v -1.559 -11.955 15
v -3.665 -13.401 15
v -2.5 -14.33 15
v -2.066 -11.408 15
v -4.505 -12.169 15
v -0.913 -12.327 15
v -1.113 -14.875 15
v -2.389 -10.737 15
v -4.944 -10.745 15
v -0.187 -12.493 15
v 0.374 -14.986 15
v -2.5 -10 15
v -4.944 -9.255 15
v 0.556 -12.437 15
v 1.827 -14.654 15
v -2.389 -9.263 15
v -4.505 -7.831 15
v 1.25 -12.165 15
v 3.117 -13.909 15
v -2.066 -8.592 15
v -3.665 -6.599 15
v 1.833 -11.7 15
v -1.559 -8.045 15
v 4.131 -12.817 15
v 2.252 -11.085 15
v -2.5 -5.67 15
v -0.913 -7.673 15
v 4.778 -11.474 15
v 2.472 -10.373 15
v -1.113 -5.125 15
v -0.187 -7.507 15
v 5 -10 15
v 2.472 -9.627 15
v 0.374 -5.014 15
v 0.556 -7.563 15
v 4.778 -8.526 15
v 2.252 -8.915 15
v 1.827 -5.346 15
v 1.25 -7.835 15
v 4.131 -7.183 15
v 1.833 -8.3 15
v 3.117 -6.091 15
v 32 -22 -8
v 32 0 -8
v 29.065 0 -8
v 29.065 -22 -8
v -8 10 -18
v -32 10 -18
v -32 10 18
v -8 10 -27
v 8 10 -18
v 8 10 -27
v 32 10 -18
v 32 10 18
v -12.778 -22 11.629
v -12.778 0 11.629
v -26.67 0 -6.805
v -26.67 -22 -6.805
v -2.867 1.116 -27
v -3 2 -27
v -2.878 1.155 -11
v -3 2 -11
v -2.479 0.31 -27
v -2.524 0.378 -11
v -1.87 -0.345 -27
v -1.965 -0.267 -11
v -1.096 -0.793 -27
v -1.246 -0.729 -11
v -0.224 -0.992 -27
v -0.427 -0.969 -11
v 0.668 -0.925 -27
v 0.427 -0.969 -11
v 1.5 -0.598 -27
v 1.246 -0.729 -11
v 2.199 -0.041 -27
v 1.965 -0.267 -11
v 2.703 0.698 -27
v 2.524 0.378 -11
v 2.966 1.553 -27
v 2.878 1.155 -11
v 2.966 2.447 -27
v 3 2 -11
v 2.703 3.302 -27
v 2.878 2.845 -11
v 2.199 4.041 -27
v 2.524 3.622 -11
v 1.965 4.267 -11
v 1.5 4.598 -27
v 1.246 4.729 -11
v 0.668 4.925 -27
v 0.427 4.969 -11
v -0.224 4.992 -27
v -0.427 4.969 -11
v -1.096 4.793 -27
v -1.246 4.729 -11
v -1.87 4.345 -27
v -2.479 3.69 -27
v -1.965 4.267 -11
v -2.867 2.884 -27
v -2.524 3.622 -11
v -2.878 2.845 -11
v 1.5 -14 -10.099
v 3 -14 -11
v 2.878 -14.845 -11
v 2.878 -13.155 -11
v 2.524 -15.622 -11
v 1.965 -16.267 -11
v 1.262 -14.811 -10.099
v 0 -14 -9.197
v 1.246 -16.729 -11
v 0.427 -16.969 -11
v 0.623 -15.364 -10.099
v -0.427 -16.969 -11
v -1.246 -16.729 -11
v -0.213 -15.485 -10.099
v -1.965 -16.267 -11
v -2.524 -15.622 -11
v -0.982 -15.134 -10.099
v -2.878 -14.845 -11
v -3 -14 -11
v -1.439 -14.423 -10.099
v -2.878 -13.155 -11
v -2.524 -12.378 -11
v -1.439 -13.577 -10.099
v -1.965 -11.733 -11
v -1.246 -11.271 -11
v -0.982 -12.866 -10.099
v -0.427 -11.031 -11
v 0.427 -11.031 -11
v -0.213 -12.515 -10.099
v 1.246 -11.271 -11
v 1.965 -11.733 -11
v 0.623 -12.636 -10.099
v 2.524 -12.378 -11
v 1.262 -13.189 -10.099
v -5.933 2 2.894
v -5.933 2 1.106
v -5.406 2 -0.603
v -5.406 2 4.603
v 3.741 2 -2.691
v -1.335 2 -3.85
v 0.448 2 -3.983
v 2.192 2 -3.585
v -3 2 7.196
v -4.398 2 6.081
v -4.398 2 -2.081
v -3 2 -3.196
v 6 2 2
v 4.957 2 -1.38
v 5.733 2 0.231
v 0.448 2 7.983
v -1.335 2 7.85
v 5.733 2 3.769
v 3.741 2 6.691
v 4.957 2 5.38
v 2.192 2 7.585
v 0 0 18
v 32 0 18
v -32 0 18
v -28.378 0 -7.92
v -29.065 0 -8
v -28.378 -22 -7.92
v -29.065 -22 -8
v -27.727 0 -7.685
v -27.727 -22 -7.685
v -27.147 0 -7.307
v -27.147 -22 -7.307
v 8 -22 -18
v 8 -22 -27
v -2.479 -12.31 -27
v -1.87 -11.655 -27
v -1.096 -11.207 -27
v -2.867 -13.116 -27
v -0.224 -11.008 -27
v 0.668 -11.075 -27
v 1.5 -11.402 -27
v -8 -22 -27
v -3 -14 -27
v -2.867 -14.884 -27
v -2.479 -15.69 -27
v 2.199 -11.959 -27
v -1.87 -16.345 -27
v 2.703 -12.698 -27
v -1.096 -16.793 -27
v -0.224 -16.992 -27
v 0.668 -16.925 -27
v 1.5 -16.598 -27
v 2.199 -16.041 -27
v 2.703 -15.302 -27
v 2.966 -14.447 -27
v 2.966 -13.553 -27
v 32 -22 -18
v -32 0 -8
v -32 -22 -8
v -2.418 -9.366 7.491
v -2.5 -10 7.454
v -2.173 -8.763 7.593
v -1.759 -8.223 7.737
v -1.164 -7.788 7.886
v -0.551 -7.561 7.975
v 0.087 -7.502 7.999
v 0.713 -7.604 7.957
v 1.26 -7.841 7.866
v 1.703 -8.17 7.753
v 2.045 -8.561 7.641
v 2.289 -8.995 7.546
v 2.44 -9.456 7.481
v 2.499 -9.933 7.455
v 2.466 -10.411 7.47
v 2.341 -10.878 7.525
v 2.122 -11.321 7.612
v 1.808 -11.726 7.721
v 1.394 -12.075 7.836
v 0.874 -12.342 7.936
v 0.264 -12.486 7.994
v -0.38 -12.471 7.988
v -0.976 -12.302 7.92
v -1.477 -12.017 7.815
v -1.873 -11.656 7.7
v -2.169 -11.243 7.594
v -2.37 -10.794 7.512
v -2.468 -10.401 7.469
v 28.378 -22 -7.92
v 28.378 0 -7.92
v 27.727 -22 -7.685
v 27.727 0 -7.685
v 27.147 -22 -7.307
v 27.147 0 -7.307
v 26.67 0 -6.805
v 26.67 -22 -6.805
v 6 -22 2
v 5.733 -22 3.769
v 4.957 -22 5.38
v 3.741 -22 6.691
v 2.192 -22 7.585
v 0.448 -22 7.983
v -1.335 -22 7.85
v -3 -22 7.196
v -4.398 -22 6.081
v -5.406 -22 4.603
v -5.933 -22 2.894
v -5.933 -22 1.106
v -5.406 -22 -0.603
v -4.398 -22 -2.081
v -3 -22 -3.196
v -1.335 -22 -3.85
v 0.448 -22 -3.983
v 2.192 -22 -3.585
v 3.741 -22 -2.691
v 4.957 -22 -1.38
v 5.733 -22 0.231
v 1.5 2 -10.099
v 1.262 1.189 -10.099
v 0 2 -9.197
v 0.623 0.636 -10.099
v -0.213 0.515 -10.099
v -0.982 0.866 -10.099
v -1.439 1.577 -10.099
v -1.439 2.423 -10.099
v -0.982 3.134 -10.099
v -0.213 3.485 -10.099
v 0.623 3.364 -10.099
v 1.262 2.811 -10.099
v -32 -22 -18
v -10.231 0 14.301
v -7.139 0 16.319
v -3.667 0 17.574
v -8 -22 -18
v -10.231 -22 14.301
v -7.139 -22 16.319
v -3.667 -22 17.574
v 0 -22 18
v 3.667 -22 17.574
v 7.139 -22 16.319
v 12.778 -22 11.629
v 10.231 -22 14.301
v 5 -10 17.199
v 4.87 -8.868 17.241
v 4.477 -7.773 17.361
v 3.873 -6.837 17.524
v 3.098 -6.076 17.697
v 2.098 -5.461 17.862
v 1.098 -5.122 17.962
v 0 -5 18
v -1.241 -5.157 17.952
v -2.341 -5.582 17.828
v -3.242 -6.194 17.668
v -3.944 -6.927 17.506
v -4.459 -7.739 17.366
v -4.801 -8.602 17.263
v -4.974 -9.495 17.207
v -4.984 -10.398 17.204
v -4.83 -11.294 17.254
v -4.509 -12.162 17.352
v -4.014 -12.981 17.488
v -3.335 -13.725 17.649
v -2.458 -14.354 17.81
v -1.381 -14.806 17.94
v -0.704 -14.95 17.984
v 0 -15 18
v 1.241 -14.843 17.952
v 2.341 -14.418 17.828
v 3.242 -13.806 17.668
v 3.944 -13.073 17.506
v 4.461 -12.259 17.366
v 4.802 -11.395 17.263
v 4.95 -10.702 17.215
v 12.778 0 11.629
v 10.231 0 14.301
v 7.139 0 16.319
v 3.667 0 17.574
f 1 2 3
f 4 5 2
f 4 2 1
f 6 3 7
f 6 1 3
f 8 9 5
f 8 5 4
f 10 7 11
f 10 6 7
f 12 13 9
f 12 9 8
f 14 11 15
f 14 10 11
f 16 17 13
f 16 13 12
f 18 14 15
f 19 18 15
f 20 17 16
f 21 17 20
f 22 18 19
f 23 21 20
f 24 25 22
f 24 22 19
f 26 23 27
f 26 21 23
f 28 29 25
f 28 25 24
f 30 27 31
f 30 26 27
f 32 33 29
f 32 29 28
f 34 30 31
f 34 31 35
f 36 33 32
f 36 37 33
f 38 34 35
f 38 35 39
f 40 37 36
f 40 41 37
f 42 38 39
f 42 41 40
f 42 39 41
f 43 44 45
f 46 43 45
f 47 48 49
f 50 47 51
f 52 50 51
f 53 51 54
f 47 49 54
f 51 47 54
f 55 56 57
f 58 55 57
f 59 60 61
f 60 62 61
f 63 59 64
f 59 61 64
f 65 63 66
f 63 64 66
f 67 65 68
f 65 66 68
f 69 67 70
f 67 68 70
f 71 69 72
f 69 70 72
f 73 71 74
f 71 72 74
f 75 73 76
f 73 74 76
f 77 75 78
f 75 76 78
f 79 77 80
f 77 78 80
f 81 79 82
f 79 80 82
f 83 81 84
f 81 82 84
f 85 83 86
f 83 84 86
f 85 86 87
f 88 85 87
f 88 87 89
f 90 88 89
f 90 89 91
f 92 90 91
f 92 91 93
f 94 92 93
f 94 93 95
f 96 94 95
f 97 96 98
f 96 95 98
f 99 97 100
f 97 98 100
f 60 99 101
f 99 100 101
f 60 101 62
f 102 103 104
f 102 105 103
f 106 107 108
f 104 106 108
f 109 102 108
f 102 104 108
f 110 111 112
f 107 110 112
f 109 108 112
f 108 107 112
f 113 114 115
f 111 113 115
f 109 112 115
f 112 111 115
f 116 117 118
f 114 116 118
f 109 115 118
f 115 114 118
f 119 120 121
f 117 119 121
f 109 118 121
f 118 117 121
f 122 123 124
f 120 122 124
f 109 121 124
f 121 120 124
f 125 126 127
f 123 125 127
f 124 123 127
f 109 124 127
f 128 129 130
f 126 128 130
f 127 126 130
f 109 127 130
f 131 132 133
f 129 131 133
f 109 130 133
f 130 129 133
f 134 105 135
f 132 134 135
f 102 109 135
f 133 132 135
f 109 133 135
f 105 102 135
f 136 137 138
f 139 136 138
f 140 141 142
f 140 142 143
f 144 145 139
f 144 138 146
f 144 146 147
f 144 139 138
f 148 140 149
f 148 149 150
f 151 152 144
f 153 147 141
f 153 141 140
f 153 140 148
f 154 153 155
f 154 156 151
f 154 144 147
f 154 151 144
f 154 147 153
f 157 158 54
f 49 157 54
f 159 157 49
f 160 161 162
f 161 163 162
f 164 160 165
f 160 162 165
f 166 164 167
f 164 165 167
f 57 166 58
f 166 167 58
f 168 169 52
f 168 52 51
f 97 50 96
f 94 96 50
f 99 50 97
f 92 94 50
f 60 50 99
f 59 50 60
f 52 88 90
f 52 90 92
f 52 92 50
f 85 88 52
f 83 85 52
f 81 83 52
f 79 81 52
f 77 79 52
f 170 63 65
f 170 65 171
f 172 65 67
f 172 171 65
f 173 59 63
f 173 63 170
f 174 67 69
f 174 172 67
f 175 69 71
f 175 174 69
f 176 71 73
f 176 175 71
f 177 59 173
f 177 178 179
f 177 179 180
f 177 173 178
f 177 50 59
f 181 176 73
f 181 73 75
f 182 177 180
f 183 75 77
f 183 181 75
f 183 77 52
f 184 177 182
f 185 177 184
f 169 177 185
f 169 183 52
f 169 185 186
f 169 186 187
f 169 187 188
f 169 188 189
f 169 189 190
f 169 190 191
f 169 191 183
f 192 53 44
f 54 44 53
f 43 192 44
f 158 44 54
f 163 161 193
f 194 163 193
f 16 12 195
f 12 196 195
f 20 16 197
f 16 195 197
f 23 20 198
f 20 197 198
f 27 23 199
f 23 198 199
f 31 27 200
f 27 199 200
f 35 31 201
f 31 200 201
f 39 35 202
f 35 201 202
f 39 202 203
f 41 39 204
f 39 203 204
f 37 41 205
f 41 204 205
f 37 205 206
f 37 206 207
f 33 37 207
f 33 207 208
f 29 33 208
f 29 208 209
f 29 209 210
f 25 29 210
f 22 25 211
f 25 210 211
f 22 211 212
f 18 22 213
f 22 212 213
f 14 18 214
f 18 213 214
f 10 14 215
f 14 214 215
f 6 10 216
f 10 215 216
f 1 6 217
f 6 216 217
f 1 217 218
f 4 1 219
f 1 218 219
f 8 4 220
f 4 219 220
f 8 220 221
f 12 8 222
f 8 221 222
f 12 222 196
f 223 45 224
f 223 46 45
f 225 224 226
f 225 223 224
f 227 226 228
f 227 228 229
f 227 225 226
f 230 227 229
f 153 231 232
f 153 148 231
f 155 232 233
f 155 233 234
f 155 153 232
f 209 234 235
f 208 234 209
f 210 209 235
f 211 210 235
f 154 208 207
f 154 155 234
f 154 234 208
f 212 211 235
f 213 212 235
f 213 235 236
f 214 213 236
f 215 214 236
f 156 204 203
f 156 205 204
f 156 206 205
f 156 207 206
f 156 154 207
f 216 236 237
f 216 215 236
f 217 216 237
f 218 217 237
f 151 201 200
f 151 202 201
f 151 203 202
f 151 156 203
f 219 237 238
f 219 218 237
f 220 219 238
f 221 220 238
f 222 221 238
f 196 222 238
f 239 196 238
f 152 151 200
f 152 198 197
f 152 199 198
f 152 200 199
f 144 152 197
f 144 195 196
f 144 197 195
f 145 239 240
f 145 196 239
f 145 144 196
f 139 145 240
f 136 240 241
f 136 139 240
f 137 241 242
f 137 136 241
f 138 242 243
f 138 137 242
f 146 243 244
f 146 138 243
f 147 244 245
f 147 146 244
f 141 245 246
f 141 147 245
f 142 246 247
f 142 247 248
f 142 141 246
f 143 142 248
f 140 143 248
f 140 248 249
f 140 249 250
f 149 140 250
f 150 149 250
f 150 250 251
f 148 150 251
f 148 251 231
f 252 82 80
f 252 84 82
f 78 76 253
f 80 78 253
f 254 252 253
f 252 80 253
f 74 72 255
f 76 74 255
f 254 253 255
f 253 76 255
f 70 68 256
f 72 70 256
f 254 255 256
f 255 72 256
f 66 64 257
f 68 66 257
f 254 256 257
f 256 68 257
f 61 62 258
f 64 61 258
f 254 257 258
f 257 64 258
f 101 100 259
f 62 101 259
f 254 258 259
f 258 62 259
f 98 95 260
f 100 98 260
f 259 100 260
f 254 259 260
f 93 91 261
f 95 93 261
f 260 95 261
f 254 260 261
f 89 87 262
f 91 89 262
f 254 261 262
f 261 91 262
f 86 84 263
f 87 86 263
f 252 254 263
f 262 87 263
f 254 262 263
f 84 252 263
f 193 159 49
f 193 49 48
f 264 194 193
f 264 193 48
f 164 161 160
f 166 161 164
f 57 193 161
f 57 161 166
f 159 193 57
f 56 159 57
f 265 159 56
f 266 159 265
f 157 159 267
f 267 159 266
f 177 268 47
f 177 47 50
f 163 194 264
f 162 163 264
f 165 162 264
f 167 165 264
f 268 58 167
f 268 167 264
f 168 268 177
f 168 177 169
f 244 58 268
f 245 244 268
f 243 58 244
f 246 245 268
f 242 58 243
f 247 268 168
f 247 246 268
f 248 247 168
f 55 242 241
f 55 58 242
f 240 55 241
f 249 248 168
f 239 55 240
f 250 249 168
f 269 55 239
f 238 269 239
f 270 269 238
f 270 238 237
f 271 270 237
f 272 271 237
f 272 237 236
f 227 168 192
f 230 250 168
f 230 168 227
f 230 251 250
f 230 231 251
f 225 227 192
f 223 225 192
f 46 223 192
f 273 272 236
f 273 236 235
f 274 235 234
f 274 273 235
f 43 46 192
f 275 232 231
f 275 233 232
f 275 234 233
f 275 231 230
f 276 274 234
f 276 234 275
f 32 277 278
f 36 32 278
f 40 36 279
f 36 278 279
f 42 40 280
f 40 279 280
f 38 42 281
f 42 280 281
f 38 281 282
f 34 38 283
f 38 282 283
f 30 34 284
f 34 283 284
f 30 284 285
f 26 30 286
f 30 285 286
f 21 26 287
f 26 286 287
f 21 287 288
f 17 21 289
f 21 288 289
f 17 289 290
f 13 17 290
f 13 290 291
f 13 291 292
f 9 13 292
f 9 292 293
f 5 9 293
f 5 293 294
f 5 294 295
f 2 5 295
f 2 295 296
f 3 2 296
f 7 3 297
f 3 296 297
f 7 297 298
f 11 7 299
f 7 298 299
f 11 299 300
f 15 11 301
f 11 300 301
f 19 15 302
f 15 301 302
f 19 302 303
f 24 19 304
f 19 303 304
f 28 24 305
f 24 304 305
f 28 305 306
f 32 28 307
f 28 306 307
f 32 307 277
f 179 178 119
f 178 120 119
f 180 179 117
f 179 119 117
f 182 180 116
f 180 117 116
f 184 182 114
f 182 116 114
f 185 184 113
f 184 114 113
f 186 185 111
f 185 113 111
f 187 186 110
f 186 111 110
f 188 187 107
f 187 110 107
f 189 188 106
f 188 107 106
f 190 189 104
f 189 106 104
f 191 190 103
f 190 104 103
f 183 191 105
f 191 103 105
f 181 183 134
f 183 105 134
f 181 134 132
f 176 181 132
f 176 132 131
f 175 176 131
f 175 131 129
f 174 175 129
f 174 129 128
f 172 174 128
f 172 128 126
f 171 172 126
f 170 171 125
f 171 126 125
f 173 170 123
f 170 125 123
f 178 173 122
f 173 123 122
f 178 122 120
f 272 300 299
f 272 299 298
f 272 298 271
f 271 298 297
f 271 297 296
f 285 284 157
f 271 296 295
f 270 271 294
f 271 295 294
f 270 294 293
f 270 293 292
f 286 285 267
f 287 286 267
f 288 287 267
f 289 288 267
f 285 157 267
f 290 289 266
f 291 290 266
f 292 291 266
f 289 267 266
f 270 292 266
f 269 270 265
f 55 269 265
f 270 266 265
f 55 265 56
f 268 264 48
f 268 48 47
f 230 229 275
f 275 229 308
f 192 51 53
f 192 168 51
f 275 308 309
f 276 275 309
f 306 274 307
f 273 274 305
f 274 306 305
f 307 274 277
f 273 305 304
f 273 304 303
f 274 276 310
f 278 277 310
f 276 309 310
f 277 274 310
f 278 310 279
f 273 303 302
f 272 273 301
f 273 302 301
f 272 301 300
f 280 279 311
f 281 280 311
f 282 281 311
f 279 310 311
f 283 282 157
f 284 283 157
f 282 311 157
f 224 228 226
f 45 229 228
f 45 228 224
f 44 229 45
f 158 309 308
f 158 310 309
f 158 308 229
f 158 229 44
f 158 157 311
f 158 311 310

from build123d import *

# Parameters (mm, degrees)
F0_R           = 6
F1_DEPTH       = 22
F2_DEPTH       = 10
F3_R           = 3
F5_D           = 5
F5_DEPTH       = 16
F5_CBORE_D     = 10
F5_CBORE_DEPTH = 3
F5_TIP         = 1.5021515476
F7_DEPTH       = 2
F8_D           = 6
F8_DEPTH       = 16
F8_TIP         = 1.8025818571


with BuildPart() as f1:
    # F0 (on Front) → F1 (new body)
    with BuildSketch(Plane.XZ):
        with BuildLine():
            ThreePointArc((12.7781681608, 11.6290403704), (7.1391649946, 16.3189497932), (-3.39e-08, 18))
            ThreePointArc((-3.39e-08, 18), (-7.1391650249, 16.3189497781), (-12.7781681608, 11.6290403704))
            Line((-12.7781681608, 11.6290403704), (-27.5697110315, -8))
            Line((-27.5697110315, -8), (-32, -8))
            Line((-32, -8), (-32, -18))
            Line((-32, -18), (-8, -18))
            Line((-8, -18), (-8, -27))
            Line((-8, -27), (8, -27))
            Line((8, -27), (8, -18))
            Line((8, -18), (32, -18))
            Line((32, -18), (32, -8))
            Line((32, -8), (27.5697110315, -8))
            Line((27.5697110315, -8), (12.7781681608, 11.6290403704))
        make_face()
        with Locations((0, 2)):
            Circle(F0_R, mode=Mode.SUBTRACT)
    extrude(amount=F1_DEPTH)

    # F0 (on Front) → F2 (join)
    with BuildSketch(Plane.XZ):
        with BuildLine():
            Line((32, -8), (32, 18))
            Line((32, 18), (-3.39e-08, 18))
            ThreePointArc((-3.39e-08, 18), (7.1391649946, 16.3189497932), (12.7781681608, 11.6290403704))
            Line((12.7781681608, 11.6290403704), (27.5697110315, -8))
            Line((27.5697110315, -8), (32, -8))
        make_face()
        with BuildLine():
            ThreePointArc((-12.7781681608, 11.6290403704), (-7.1391650249, 16.3189497781), (-3.39e-08, 18))
            Line((-3.39e-08, 18), (-32, 18))
            Line((-32, 18), (-32, -8))
            Line((-32, -8), (-27.5697110315, -8))
            Line((-27.5697110315, -8), (-12.7781681608, 11.6290403704))
        make_face()
        with BuildLine():
            ThreePointArc((12.7781681608, 11.6290403704), (7.1391649946, 16.3189497932), (-3.39e-08, 18))
            ThreePointArc((-3.39e-08, 18), (-7.1391650249, 16.3189497781), (-12.7781681608, 11.6290403704))
            Line((-12.7781681608, 11.6290403704), (-27.5697110315, -8))
            Line((-27.5697110315, -8), (-32, -8))
            Line((-32, -8), (-32, -18))
            Line((-32, -18), (-8, -18))
            Line((-8, -18), (-8, -27))
            Line((-8, -27), (8, -27))
            Line((8, -27), (8, -18))
            Line((8, -18), (32, -18))
            Line((32, -18), (32, -8))
            Line((32, -8), (27.5697110315, -8))
            Line((27.5697110315, -8), (12.7781681608, 11.6290403704))
        make_face()
        with Locations((0, 2)):
            Circle(F0_R, mode=Mode.SUBTRACT)
        with Locations((0, 2)):
            Circle(F0_R)
    extrude(amount=-F2_DEPTH)

    # F3
    f3_edges = [f1.edges().sort_by_distance(p)[0] for p in [
        (-27.569711, -11, -8),
        (27.569711, -11, -8),
    ]]
    fillet(f3_edges, radius=F3_R)

    # F5
    with Locations(Plane.XY.offset(18)):
        with Locations((0, -10)):
            CounterBoreHole(F5_D / 2, F5_CBORE_D / 2, F5_CBORE_DEPTH, depth=F5_DEPTH)
            with Locations((0, 0, -(F5_DEPTH + F5_TIP / 2))):  # 118° drill point
                Cone(0, F5_D / 2, F5_TIP, mode=Mode.SUBTRACT)

    # F0 (on Front) → F7 (cut)
    with BuildSketch(Plane.XZ):
        with Locations((0, 2)):
            Circle(F0_R)
    extrude(amount=-F7_DEPTH, mode=Mode.SUBTRACT)

    # F8
    with Locations(Plane(origin=(0, 0, -27), x_dir=(1, 0, 0), z_dir=(0, 0, -1))):
        with Locations((0, -2), (0, 14)):
            Hole(F8_D / 2, depth=F8_DEPTH)
            with Locations((0, 0, -(F8_DEPTH + F8_TIP / 2))):  # 118° drill point
                Cone(0, F8_D / 2, F8_TIP, mode=Mode.SUBTRACT)


solid = f1.part
